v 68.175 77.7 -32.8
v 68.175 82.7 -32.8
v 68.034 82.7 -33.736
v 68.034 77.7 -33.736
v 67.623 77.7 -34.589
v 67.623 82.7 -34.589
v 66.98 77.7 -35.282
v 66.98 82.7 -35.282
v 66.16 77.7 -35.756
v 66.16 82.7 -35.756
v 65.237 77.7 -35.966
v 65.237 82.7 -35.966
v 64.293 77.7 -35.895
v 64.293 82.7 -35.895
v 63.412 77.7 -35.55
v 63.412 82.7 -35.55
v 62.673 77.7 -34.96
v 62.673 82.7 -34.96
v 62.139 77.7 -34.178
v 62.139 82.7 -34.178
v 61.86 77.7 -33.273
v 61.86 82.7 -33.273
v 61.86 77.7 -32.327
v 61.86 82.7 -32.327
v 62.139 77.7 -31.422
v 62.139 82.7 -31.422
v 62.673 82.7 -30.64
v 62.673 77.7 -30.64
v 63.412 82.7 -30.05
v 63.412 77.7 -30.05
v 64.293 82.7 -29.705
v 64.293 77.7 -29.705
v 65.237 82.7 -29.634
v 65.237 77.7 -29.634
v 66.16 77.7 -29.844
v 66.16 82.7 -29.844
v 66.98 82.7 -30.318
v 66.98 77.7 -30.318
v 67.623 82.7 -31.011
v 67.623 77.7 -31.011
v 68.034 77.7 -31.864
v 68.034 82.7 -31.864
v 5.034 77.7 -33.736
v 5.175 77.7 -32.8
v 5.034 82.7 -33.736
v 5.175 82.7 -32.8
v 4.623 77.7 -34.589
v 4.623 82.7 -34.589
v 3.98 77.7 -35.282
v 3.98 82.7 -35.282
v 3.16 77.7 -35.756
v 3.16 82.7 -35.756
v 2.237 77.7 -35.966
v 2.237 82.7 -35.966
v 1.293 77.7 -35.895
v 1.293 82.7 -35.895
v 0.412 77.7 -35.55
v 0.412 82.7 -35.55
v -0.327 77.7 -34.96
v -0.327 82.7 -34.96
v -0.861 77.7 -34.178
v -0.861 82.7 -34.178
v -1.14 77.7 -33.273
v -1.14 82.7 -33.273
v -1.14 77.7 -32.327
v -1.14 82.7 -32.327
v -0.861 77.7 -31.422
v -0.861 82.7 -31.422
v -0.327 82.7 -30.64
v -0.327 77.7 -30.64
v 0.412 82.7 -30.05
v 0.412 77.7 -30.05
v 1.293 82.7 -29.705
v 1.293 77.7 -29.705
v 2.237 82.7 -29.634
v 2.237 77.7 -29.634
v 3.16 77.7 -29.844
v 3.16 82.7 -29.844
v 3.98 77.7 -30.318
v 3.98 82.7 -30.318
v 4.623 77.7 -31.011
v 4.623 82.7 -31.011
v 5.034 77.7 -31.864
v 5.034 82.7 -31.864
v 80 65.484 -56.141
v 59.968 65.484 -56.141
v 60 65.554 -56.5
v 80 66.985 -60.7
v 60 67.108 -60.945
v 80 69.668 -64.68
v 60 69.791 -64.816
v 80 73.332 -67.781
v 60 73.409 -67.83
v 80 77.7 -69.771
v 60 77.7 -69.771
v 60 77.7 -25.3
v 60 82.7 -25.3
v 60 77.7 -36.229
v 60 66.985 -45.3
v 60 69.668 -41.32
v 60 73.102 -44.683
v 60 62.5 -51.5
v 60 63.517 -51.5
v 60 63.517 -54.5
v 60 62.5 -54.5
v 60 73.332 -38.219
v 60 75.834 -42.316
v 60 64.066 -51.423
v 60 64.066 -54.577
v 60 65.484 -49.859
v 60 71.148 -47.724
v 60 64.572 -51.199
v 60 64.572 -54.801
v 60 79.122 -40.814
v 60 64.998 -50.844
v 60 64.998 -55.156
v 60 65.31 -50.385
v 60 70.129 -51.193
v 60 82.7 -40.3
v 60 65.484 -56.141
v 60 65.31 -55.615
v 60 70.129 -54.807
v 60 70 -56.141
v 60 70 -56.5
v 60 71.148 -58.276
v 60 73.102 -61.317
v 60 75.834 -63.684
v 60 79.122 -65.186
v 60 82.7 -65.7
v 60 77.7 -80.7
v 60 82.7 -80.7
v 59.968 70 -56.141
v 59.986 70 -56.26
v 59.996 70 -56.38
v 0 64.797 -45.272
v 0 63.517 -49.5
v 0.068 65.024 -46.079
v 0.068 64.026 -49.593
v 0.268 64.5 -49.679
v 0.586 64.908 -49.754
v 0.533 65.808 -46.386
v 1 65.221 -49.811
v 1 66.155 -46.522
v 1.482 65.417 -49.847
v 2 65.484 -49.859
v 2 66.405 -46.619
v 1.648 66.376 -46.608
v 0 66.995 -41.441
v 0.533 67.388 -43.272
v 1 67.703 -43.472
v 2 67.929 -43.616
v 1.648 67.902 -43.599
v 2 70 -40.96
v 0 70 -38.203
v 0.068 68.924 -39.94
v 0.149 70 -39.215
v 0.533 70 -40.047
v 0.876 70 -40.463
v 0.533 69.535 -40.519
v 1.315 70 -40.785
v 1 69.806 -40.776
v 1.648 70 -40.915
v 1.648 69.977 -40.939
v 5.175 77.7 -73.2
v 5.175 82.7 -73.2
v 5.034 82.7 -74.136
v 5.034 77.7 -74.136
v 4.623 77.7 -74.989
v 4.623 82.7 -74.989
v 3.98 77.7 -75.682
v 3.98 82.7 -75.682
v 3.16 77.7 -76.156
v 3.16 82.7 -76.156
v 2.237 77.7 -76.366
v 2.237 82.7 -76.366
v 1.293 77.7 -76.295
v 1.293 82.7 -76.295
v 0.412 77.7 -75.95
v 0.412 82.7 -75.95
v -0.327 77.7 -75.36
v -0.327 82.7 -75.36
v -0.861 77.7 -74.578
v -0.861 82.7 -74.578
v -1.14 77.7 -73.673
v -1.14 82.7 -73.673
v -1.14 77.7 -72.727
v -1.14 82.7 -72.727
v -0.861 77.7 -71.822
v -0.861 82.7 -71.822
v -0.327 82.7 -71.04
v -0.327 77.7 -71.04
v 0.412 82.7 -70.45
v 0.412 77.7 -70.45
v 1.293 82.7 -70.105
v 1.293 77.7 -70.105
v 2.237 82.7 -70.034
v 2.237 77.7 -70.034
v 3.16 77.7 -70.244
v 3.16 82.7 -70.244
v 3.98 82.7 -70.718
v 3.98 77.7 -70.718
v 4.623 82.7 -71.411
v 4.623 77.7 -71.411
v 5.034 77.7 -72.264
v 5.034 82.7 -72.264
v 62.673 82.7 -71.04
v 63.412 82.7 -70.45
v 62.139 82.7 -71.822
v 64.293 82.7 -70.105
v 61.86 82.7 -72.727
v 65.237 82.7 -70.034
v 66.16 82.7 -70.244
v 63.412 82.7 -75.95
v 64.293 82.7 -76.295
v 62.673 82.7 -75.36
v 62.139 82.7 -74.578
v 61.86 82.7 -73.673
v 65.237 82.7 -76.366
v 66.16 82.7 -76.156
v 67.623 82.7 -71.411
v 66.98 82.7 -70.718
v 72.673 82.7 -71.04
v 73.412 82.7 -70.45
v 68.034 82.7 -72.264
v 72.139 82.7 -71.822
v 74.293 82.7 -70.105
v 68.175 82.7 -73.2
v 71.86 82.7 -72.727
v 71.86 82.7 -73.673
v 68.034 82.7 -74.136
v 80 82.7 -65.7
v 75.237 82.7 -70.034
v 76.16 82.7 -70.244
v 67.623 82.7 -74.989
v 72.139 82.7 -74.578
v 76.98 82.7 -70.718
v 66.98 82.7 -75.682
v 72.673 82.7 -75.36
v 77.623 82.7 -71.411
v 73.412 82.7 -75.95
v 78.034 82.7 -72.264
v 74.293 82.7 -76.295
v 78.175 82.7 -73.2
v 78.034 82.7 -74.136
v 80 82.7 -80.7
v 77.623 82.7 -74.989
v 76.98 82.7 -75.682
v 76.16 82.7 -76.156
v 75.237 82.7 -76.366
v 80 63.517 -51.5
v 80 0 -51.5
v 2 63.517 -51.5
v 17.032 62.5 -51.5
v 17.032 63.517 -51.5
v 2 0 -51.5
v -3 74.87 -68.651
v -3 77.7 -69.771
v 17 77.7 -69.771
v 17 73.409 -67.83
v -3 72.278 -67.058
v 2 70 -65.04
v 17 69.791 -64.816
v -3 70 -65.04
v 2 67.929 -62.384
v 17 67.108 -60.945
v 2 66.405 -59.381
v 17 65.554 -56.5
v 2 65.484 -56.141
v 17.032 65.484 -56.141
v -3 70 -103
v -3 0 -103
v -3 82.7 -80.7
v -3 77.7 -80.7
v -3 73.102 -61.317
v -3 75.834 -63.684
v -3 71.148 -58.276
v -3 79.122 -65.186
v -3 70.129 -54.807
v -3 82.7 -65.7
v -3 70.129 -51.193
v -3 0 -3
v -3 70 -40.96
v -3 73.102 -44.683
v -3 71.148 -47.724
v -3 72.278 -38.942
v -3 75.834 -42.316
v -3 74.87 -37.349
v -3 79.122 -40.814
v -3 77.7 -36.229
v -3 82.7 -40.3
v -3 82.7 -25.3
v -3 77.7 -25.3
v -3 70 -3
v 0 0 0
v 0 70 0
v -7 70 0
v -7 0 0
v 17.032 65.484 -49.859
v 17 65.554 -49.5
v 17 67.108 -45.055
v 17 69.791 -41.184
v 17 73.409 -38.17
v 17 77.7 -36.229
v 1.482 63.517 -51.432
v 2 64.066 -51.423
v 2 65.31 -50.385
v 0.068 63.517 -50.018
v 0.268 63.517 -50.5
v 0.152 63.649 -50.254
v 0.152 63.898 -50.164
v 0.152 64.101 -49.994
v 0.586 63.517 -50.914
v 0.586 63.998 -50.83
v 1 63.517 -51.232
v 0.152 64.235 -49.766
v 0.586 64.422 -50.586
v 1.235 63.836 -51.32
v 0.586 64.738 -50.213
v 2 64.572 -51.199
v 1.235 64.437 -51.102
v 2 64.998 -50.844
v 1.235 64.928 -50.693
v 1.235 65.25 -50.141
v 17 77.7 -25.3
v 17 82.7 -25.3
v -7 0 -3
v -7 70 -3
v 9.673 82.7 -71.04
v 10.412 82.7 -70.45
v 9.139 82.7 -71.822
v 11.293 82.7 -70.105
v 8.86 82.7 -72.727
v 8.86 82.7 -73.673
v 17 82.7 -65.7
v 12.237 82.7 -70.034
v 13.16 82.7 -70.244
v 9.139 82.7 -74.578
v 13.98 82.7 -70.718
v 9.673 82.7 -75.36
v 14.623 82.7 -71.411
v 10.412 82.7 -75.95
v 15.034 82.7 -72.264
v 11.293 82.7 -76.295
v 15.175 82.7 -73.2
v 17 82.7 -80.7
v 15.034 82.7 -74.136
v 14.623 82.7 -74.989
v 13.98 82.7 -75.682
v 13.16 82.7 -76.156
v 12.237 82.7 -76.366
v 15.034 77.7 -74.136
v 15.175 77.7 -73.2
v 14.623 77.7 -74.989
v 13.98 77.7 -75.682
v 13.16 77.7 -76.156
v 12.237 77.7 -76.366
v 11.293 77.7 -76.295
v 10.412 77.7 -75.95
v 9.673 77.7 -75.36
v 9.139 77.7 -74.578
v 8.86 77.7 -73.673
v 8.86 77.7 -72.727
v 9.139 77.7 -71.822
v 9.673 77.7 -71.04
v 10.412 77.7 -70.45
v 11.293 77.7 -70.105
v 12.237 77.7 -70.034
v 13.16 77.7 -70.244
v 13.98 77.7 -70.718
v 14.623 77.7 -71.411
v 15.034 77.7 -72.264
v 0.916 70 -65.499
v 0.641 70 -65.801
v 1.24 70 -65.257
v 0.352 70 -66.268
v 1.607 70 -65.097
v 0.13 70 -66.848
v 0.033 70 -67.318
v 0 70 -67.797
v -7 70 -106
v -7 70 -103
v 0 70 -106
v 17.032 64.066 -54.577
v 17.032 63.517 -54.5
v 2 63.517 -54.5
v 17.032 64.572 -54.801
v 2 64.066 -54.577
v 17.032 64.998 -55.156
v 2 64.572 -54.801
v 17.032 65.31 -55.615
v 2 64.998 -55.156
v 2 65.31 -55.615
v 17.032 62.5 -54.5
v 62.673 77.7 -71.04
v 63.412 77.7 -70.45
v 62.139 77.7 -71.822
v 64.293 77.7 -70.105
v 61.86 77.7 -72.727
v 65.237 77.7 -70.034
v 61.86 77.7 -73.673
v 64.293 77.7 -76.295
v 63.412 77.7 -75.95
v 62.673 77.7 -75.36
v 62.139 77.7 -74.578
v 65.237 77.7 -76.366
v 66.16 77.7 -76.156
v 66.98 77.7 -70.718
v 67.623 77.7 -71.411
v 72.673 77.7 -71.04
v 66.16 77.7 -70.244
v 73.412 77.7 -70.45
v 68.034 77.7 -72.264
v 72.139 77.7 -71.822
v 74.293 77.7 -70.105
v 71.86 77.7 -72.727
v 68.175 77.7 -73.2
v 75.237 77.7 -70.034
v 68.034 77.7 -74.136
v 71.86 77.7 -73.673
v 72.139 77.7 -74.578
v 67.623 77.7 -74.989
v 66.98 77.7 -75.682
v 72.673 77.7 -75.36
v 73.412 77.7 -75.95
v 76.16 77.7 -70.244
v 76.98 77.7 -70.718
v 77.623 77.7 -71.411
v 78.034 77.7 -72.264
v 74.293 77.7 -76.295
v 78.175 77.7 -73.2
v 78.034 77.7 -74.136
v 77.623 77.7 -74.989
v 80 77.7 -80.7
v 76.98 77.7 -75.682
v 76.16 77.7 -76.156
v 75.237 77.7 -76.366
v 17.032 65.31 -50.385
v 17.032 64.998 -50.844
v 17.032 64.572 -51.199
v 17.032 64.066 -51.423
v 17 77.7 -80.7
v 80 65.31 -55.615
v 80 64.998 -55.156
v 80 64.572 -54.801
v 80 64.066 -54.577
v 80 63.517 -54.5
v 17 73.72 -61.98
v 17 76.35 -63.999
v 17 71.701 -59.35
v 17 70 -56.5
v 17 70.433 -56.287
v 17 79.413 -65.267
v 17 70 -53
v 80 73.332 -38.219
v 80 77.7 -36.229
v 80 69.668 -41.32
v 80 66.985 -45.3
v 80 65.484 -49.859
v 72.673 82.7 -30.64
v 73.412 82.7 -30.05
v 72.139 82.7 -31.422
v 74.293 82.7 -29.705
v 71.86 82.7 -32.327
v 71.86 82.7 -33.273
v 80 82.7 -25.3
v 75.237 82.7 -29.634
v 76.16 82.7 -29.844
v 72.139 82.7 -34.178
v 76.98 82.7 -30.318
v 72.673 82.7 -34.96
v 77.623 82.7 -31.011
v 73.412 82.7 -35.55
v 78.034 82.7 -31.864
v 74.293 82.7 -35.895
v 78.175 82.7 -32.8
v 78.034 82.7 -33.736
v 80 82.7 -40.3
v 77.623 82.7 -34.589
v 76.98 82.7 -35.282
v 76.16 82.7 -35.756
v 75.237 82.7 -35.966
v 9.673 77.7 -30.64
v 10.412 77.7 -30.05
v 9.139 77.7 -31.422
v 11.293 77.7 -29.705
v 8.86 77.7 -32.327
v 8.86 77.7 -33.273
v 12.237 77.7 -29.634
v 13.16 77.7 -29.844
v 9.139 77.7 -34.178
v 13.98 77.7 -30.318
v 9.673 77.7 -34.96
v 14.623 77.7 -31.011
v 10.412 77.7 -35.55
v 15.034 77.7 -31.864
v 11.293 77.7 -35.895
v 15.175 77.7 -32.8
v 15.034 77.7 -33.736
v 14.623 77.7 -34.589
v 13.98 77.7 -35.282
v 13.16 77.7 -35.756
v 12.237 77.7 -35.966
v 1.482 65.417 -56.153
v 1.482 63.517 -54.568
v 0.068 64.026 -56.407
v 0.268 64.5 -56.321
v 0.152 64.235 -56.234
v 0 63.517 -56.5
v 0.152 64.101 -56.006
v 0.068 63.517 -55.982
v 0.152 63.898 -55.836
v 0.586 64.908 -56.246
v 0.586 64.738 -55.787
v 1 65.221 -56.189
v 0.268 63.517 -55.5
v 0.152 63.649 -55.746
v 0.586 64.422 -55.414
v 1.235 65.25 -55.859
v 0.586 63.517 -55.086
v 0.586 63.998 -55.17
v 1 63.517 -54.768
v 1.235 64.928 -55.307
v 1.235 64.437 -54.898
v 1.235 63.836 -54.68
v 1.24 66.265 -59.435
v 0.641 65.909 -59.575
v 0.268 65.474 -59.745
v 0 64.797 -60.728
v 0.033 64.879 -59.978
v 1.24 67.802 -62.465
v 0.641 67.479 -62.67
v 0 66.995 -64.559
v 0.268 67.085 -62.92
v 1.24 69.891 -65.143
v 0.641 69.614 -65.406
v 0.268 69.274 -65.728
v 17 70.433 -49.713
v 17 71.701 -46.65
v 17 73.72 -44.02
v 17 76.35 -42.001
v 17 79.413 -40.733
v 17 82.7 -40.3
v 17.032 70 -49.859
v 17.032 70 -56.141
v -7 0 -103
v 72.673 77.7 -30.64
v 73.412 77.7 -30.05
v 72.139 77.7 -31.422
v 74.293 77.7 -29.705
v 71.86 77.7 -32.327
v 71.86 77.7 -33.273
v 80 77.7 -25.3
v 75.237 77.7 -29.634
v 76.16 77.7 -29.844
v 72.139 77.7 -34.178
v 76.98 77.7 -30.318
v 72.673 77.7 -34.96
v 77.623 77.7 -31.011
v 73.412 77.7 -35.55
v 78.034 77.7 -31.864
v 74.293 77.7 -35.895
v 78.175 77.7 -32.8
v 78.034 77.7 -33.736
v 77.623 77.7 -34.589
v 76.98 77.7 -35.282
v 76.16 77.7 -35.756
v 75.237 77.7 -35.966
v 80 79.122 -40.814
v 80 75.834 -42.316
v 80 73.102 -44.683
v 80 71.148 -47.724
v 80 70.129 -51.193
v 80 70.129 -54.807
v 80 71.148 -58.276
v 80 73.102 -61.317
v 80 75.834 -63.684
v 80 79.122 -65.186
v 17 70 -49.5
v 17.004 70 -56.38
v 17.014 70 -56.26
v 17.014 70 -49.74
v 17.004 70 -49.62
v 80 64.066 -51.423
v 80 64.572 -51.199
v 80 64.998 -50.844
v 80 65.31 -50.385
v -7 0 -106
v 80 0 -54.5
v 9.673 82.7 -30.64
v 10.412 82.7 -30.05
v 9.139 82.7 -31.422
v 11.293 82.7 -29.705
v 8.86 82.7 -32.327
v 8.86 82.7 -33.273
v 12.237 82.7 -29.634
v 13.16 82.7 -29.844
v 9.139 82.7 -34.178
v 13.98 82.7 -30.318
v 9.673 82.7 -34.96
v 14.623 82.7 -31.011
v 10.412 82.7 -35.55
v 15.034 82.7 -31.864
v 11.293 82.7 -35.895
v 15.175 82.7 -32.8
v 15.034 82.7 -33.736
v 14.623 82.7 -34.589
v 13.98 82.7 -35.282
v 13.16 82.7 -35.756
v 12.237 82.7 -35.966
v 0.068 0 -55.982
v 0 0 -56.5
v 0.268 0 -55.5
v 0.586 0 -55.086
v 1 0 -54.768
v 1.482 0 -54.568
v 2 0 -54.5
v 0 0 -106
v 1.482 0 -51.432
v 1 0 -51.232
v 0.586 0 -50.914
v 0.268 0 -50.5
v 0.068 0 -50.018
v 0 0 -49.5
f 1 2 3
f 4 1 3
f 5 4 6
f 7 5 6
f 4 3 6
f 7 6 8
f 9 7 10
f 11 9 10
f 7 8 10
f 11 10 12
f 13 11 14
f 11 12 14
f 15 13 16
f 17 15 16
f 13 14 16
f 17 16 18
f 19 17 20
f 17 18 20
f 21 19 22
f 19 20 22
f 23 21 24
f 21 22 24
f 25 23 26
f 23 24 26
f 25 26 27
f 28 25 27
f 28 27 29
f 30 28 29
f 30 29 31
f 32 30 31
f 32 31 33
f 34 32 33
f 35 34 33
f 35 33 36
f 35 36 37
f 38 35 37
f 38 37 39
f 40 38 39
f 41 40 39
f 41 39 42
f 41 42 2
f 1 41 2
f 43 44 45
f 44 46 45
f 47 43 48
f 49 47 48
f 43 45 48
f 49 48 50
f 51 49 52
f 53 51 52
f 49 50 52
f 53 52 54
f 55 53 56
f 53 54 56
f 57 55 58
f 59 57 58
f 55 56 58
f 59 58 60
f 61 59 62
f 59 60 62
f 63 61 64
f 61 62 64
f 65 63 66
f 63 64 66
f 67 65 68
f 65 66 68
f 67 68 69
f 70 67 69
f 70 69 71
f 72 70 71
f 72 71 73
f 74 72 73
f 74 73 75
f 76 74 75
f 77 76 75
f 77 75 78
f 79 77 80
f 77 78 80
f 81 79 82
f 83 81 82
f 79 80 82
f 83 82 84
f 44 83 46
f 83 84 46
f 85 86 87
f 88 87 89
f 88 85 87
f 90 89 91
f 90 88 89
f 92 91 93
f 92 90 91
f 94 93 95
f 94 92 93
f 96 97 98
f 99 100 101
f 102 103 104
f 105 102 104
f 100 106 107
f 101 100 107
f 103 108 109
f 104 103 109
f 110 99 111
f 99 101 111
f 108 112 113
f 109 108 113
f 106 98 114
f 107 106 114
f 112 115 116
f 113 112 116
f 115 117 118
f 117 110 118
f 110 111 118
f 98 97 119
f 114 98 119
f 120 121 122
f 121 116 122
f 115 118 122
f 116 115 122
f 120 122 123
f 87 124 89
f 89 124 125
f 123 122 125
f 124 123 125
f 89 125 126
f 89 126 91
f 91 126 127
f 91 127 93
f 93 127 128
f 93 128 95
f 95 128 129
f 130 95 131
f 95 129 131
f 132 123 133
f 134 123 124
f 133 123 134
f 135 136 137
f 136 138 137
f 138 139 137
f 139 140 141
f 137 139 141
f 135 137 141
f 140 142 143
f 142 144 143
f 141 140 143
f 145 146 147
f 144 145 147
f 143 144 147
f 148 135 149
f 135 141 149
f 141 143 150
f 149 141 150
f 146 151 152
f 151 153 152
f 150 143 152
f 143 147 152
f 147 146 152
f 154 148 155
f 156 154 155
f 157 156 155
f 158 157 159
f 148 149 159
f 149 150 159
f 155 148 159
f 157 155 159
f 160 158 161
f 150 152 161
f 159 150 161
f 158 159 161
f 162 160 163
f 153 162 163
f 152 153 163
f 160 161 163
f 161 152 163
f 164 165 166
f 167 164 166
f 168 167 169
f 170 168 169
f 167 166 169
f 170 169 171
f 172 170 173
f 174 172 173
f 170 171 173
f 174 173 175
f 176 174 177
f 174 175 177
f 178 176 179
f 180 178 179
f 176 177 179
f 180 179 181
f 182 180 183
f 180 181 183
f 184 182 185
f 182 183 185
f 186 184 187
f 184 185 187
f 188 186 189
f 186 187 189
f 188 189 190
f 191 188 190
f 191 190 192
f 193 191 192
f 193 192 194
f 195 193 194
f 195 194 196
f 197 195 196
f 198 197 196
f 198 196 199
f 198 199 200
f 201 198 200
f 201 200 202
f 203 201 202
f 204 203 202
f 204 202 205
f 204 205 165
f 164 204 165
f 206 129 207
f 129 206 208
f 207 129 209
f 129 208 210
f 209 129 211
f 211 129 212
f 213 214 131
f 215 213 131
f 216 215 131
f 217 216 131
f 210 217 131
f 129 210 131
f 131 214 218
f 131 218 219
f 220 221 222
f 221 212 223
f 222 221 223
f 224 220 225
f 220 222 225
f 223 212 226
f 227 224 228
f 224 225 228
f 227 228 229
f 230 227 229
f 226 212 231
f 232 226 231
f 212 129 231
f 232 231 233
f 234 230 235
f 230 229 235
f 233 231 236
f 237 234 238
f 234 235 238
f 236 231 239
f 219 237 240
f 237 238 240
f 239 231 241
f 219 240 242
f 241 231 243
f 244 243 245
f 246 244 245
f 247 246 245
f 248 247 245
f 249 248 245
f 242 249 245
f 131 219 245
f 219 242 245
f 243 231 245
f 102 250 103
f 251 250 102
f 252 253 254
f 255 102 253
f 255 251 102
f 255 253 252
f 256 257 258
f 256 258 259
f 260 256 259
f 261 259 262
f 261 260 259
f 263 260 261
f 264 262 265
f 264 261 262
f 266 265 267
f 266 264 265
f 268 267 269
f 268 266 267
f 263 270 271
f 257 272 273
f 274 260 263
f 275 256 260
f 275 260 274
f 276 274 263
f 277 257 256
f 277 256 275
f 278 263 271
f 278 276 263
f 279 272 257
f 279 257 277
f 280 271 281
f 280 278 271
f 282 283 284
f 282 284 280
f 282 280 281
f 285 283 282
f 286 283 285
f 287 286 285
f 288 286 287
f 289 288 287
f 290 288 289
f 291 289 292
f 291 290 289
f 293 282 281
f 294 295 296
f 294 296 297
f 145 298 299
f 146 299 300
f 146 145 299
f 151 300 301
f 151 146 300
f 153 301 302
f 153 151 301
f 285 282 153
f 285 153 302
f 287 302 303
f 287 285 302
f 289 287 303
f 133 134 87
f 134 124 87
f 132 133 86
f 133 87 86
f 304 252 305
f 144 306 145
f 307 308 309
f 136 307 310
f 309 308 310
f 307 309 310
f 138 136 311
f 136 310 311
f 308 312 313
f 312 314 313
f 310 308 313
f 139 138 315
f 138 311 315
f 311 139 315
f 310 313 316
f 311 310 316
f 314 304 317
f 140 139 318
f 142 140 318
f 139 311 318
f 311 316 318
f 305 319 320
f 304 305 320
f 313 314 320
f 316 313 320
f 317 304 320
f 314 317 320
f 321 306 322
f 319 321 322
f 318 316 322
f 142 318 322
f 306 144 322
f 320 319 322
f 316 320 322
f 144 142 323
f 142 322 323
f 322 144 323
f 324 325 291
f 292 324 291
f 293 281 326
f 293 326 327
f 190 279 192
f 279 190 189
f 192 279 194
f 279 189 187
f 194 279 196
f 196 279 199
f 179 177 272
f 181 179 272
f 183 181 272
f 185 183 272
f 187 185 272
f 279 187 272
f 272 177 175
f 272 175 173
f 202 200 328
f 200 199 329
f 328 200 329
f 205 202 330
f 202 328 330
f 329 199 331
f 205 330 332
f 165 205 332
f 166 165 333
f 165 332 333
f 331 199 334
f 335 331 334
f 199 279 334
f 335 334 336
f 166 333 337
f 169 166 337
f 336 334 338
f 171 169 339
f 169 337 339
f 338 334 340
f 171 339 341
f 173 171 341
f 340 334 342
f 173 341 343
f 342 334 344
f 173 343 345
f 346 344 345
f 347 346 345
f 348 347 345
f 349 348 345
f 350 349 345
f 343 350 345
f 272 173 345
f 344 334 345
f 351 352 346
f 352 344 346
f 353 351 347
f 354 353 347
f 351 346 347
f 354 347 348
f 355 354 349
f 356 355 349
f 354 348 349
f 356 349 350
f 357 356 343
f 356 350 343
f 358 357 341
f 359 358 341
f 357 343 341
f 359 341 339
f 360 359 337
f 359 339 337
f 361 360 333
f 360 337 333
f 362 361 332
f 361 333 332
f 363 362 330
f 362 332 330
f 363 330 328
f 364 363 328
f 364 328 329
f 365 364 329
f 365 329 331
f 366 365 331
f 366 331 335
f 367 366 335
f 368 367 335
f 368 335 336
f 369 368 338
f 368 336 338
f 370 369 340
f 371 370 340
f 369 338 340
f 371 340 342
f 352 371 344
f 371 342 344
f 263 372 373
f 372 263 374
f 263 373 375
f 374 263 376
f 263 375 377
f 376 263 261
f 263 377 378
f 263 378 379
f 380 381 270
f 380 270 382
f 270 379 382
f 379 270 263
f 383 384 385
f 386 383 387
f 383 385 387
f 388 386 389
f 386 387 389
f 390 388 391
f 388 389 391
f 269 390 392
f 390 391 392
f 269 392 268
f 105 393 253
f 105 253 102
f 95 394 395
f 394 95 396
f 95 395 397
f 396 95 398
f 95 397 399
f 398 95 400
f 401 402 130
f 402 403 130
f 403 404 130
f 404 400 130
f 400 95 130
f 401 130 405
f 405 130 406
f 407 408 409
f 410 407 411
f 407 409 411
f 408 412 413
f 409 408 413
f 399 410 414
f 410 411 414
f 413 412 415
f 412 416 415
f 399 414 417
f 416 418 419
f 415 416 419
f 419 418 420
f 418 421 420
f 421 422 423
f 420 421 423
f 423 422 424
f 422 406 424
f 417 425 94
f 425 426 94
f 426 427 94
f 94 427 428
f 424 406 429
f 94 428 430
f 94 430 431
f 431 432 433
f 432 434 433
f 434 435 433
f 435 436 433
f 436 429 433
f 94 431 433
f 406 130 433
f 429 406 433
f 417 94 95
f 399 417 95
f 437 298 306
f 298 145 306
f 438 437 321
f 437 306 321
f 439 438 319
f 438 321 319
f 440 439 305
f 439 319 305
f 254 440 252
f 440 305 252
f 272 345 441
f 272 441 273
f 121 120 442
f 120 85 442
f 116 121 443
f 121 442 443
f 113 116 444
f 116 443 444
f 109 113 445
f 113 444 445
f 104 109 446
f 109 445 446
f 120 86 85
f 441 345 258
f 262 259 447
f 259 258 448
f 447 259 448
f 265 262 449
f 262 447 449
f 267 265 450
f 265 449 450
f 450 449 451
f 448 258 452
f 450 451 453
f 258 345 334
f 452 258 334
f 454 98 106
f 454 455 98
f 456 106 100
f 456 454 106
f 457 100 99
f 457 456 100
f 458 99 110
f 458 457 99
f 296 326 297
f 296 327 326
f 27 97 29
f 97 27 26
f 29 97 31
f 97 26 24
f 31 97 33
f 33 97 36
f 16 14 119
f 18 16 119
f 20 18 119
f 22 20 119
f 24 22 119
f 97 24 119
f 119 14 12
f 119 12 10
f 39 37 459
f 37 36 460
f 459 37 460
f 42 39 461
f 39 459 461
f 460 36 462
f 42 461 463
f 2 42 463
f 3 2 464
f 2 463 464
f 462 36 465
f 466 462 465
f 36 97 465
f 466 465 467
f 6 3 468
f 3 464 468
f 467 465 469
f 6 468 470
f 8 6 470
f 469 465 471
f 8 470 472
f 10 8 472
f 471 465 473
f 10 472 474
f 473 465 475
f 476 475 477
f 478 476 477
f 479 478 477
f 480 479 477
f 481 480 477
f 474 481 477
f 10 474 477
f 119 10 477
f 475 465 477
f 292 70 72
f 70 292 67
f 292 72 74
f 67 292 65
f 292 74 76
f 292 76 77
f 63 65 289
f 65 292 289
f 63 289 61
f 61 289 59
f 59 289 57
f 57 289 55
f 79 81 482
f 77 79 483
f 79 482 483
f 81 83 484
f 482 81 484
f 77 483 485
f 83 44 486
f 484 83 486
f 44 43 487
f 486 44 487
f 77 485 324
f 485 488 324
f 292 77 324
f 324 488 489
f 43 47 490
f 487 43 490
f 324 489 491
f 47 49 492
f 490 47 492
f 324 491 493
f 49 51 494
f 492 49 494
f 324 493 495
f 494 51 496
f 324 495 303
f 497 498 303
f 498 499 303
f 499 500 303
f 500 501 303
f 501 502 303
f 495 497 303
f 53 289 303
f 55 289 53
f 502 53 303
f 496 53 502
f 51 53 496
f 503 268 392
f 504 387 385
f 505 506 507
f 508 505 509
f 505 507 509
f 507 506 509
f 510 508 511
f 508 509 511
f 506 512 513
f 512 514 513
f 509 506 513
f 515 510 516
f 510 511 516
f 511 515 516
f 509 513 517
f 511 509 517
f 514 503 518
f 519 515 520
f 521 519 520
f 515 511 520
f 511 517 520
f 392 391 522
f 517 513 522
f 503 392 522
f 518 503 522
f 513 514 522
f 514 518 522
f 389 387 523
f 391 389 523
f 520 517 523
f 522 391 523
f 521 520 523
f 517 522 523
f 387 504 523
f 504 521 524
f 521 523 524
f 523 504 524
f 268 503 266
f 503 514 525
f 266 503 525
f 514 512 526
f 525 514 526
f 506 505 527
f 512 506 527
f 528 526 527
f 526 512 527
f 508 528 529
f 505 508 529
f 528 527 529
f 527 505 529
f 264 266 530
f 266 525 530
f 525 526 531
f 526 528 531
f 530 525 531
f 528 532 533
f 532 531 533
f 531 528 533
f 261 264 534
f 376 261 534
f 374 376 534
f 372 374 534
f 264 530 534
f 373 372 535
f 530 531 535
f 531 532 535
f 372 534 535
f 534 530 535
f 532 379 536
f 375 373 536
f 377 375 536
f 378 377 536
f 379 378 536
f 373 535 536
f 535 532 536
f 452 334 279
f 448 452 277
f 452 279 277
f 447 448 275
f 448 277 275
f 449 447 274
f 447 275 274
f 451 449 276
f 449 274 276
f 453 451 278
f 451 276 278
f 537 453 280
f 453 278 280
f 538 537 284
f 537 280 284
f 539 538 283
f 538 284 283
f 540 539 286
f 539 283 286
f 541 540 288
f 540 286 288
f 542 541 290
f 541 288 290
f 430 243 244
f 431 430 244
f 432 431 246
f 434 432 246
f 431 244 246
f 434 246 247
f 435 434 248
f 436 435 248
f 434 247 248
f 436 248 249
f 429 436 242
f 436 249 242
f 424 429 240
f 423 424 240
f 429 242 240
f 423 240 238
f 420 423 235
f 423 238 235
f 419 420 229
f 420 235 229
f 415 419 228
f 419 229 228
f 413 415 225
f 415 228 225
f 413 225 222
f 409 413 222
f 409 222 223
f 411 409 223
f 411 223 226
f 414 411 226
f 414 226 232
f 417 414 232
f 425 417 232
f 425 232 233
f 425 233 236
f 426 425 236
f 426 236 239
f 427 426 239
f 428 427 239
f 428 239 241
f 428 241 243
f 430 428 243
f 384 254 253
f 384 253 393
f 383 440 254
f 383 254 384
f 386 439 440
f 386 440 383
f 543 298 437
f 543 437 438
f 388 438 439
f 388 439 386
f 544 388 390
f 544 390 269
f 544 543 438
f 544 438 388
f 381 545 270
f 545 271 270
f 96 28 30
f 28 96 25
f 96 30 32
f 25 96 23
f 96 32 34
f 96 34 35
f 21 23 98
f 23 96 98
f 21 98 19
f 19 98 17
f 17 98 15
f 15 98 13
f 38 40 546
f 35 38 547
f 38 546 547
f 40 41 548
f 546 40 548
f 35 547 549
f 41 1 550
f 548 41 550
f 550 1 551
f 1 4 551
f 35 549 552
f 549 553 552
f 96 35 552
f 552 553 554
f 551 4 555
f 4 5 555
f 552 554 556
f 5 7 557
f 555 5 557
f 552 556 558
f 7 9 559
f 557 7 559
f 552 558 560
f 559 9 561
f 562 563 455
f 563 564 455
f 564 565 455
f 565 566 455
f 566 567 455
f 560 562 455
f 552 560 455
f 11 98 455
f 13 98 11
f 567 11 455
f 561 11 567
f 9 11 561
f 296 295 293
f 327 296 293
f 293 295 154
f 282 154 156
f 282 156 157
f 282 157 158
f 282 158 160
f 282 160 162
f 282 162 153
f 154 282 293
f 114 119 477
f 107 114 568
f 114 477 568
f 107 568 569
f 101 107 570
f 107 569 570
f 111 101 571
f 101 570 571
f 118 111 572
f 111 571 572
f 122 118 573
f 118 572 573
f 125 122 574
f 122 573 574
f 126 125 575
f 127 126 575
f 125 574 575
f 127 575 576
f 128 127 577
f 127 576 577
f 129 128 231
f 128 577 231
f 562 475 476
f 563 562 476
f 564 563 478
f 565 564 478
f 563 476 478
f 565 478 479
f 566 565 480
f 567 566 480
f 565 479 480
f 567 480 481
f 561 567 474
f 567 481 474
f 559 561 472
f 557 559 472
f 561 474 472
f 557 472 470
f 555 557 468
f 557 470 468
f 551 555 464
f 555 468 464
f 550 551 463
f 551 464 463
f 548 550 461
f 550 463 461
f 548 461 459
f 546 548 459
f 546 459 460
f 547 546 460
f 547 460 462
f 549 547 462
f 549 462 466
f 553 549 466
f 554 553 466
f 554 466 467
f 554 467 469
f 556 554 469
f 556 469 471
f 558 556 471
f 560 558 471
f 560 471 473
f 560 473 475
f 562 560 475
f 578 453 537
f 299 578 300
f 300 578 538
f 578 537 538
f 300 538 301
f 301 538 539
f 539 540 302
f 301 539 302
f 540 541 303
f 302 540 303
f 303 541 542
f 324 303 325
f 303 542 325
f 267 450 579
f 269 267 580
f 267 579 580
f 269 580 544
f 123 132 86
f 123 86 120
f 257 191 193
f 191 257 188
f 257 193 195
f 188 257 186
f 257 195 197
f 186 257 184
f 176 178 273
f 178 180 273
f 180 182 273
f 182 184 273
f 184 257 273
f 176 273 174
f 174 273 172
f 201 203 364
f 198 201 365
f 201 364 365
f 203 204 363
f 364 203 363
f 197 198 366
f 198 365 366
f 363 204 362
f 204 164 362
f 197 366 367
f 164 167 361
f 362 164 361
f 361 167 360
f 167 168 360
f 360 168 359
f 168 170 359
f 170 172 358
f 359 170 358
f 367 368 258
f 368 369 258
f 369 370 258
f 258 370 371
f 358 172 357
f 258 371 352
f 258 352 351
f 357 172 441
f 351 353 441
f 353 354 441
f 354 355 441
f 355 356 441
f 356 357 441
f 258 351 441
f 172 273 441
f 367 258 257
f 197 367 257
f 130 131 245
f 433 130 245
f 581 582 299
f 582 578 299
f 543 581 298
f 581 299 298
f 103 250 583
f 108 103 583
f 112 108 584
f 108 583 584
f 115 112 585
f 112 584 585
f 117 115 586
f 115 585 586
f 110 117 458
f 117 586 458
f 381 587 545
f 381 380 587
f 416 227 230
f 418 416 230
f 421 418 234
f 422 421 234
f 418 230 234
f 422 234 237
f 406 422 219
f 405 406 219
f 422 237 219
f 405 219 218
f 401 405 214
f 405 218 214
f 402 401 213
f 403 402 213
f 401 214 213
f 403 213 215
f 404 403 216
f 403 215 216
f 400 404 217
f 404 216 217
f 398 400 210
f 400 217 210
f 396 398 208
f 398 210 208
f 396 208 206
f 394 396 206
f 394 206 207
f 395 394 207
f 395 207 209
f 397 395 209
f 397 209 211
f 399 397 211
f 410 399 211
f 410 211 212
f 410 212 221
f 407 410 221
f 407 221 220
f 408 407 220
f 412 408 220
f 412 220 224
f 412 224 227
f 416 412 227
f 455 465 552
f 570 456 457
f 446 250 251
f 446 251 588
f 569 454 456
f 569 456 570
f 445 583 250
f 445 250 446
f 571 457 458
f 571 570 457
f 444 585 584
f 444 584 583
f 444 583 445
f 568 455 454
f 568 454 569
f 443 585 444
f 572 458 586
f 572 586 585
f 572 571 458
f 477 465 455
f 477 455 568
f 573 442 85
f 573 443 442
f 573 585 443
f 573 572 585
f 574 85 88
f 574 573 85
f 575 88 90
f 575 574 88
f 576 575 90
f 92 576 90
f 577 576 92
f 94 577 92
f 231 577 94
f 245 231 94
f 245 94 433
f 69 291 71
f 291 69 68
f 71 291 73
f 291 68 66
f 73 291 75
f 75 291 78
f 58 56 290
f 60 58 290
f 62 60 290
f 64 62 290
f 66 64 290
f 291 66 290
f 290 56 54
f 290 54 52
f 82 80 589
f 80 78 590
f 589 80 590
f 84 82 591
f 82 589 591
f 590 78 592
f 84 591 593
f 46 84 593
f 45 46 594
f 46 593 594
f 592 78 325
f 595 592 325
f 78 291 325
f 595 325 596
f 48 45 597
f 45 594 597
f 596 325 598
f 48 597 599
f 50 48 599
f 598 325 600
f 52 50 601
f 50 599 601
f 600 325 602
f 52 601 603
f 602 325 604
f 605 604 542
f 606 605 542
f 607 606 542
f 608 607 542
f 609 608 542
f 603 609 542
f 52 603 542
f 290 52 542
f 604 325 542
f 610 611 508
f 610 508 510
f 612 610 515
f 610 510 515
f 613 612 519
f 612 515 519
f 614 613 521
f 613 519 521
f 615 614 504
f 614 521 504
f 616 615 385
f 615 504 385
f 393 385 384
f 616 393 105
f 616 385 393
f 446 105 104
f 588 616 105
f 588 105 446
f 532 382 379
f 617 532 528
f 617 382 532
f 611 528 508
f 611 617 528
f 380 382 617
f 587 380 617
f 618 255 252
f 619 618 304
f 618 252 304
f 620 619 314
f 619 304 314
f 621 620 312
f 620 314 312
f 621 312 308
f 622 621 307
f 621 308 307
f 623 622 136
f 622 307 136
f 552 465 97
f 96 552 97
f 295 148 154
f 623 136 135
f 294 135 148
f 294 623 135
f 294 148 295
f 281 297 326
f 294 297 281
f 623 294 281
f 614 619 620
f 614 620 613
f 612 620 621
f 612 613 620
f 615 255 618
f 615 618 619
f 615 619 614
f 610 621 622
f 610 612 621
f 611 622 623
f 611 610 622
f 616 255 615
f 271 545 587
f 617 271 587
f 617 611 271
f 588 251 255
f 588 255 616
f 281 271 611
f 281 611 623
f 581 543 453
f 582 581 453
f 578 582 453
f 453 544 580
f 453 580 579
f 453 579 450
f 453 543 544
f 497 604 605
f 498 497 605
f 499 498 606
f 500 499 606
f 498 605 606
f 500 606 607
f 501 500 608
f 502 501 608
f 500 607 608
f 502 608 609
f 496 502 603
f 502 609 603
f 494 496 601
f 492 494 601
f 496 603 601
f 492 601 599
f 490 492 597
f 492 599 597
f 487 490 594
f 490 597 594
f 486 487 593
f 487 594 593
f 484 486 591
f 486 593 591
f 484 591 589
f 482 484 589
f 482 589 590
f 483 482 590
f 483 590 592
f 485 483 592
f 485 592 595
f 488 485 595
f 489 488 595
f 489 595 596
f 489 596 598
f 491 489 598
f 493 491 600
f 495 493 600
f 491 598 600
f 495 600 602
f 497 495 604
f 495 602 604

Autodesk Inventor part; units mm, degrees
ref_plane "YZ Plane" through (0, 0, 0) normal (1, 0, 0) x (0, 1, 0)
ref_plane "XZ Plane" through (0, 0, 0) normal (0, 1, 0) x (-1, 0, 0)
ref_plane "XY Plane" through (0, 0, 0) normal (0, 0, 1) x (1, 0, 0)
sketch "Sketch1" plane through (0, 0, 0) normal (0, 1, 0) x (-1, 0, 0)
  line L0 (0, 0) -> (3, 0)
  line L1 (3, 0) -> (3, -106)
  line L2 (3, -106) -> (0, -106)
  line L3 (0, -106) -> (0, 0)
  line L4 (0, -53) -> (-80, -53) construction
  line L5 (-80, -51.5) -> (0, -51.5)
  line L6 (0, -51.5) -> (0, -54.5)
  line L7 (0, -54.5) -> (-80, -54.5)
  line L8 (-80, -54.5) -> (-80, -51.5)
  line L9 (-80, -51.5) -> (0, -54.5) construction
  line L10 (0, -51.5) -> (-80, -54.5) construction
  point P0 (-40, -53)
  dimension "d0" = 3
  dimension "d1" = 106
  dimension "d2" = 80
  dimension "d3" = 3
extrude "Extrusion1" add sketch "Sketch1" along normal blind 70
sketch "Sketch2" plane through (-3, 0, -106) normal (-1, 0, 0) x (0, 0, 1)
  line L0 (0, 0) -> (106, 0) projected
  line L1 (0, 70) -> (106, 70) projected
  line L2 (106, 0) -> (103, 0)
  line L3 (103, 0) -> (103, 70)
  line L4 (103, 70) -> (106, 70)
  line L5 (106, 70) -> (106, 0)
  dimension "d6" = 3
sketch "Sketch3" plane through (-3, 0, -106) normal (-1, 0, 0) x (0, 0, 1)
  line L0 (51.5, 70) -> (0, 70) projected
  line L1 (0, 0) -> (3, 0)
  line L2 (3, 0) -> (3, 70)
  line L3 (3, 70) -> (0, 70)
  line L4 (0, 70) -> (0, 0)
  point P0 (106, 0)
  dimension "d7" = 3
sketch "Sketch4" plane through (-3, 0, -106) normal (-1, 0, 0) x (0, 0, 1)
  line L0 (51.5, 0) -> (0, 0) projected
  line L1 (51.5, 70) -> (0, 70) projected
  line L2 (0, 0) -> (3, 0)
  line L3 (3, 0) -> (3, 70)
  line L4 (3, 70) -> (0, 70)
  line L5 (0, 70) -> (0, 0)
  point P0 (106, 0)
  dimension "d8" = 3
extrude "Extrusion2" add sketch "Sketch2" along normal blind 4
extrude "Extrusion3" add sketch "Sketch4" along normal blind 4
sketch "Sketch5" plane through (-3, 0, -3) normal (-1, 0, 0) x (0, 0, 1)
  line L0 (-103, 0) -> (-103, 70) construction
  line L1 (-103, 70) -> (3, 70) construction
  line L2 (3, 70) -> (-50, 70) construction
  line L3 (-50, 70) -> (-50, 82.7) construction
  circle A0 centre (-50, 82.7) radius 12.7
  circle A1 centre (-50, 82.7) radius 17.5
  point P0 (3, 0)
  dimension "d13" = 12.7
  dimension "d14" = 25.4
  dimension "d15" = 35
extrude "Extrusion4" add sketch "Sketch5" against normal blind 20
sketch "Sketch6" plane through (80, 0, -51.5) normal (1, 0, 0) x (0, 0, -1)
  circle A0 centre (1.5, 82.7) radius 12.7 projected
  circle A1 centre (1.5, 82.7) radius 12.7
  circle A2 centre (1.5, 82.7) radius 17.5
  point P0 (-51.5, 0)
  point P1 (1.5, 70)
extrude "Extrusion5" add sketch "Sketch6" against normal blind 20
sketch "Sketch7" plane through (80, 0, -51.5) normal (1, 0, 0) x (0, 0, -1)
  arc A0 (3, 65.2644) -> (0, 65.2644) centre (1.5, 82.7) ccw projected
  line L0 (1.5, 82.7) -> (-23.0448, 82.7)
  line L1 (-23.0448, 82.7) -> (-23.0448, 99.7436)
  line L2 (-23.0448, 99.7436) -> (1.5, 99.7436)
  line L3 (1.5, 99.7436) -> (1.5, 82.7)
  line L4 (-23.0448, 82.7) -> (23.5266, 82.7)
  line L5 (23.5266, 82.7) -> (23.5266, 103.3181)
  line L6 (23.5266, 103.3181) -> (-23.0448, 103.3181)
  line L7 (-23.0448, 103.3181) -> (-23.0448, 82.7)
  point P0 (-51.5, 0)
extrude "Extrusion6" cut sketch "Sketch7" against normal blind 2000
sketch "Sketch8" plane through (80, 82.7, -65.7) normal (0, 1, 0) x (1, 0, 0)
  line L0 (-83, -25.4) -> (-83, 0) projected
  line L1 (-83, 0) -> (-63, 0)
  line L2 (-63, 0) -> (-63, 15)
  line L3 (-63, 15) -> (-83, 15)
  line L4 (-83, 15) -> (-83, 0)
  line L5 (0, 0) -> (-20, 0) projected
  line L6 (0, 0) -> (-20, 0)
  line L7 (-20, 0) -> (-20, 15)
  line L8 (-20, 15) -> (0, 15)
  line L9 (0, 15) -> (0, 0)
  line L10 (-20, -25.4) -> (0, -25.4) projected
  line L11 (-20, -25.4) -> (0, -25.4)
  line L12 (0, -25.4) -> (0, -40.4)
  line L13 (0, -40.4) -> (-20, -40.4)
  line L14 (-20, -40.4) -> (-20, -25.4)
  line L15 (-83, -25.4) -> (-63, -25.4)
  line L16 (-63, -25.4) -> (-63, -40.4)
  line L17 (-63, -40.4) -> (-83, -40.4)
  line L18 (-83, -40.4) -> (-83, -25.4)
  point P0 (-80, -65.7)
  dimension "d22" = 15
  dimension "d23" = 15
  dimension "d24" = 15
  dimension "d25" = 20
extrude "Extrusion7" add sketch "Sketch8" against normal blind 5
fillet "Fillet1" radius 2 12 edges at (0, 32.6322, -54.5) (0, 66.7372, -60.1721) (8.5, 65.2644, -54.5) (17, 67.6322, -54.5) (70, 65.2644, -54.5) (60, 67.6322, -54.5) (0, 32.6322, -51.5) (8.5, 65.2644, -51.5) (0, 66.7372, -45.8279) (17, 67.6322, -51.5) (70, 65.2644, -51.5) (60, 67.6322, -51.5)
sketch "Sketch9" plane through (0, 70, 0) normal (0, 1, 0) x (1, 0, 0)
  arc A0 (17.0325, 56.141) -> (19, 54.5) centre (19, 56.5) ccw projected
  line L0 (60, 49.5) -> (60, 53) projected
  line L1 (17.0325, 56.141) -> (60, 56.141)
  line L2 (60, 56.141) -> (60, 49.5)
  line L3 (60, 49.5) -> (17.0325, 49.5)
  line L4 (17.0325, 49.5) -> (17.0325, 56.141)
  point P0 (0, 0)
extrude "Extrusion8" cut sketch "Sketch9" against normal blind 7.5
sketch "Sketch10" plane through (-3, 82.7, -40.3) normal (0, 1, 0) x (1, 0, 0)
  line L0 (20, -4.0705) -> (20, -15) projected
  line L1 (0, 0) -> (20, 0) projected
  line L2 (20, -15) -> (0, -15)
  line L3 (0, -15) -> (0, 0)
  line L4 (0, 0) -> (20, 0)
  line L5 (20, 0) -> (20, -15)
  line L6 (20, -15) -> (0, -15) construction
  line L7 (10, -15) -> (10, 40.4) construction
  line L8 (0, 40.4) -> (20, 40.4) construction
  line L9 (0, -15) -> (10, 0) construction
  line L10 (0, 0) -> (10, -15) construction
  line L11 (20, 0) -> (10, -15) construction
  line L12 (20, -15) -> (10, 0) construction
  line L13 (20, 25.4) -> (0, 25.4) construction
  line L14 (10, 25.4) -> (0, 40.4) construction
  line L15 (0, 62.7) -> (0, -37.3) construction
  line L16 (0, 25.4) -> (10, 40.4) construction
  line L17 (10, 40.4) -> (20, 25.4) construction
  line L18 (20, 25.4) -> (15, 32.9) construction
  line L19 (20, 40.4) -> (20, 25.4) construction
  line L20 (10, 25.4) -> (20, 40.4) construction
  circle A0 centre (5, -7.5) radius 3.175
  circle A1 centre (15, -7.5) radius 3.175
  circle A2 centre (5, 32.9) radius 3.175
  circle A3 centre (15, 32.9) radius 3.175
  point P0 (3, -40.3)
  dimension "d31" = 6.35
  dimension "d32" = 6.35
  dimension "d33" = 6.35
  dimension "d34" = 6.35
extrude "Extrusion9" cut sketch "Sketch10" against normal blind 7.5 contours A0 | A1 | A2 | A3
sketch "Sketch11" plane through (60, 82.7, -40.3) normal (0, 1, 0) x (1, 0, 0)
  line L0 (20, -15) -> (0, -15) construction
  line L1 (10, -15) -> (10, 40.4) construction
  line L2 (0, 40.4) -> (20, 40.4) construction
  line L3 (0, 40.4) -> (10, 25.4) construction
  line L4 (20, 25.4) -> (0, 25.4) construction
  line L5 (5, 32.9) -> (20, 32.9) construction
  line L6 (20, 40.4) -> (20, 29.4705) construction
  line L7 (10, 25.4) -> (20, 40.4) construction
  line L8 (0, -15) -> (10, 0) construction
  line L9 (0, 0) -> (20, 0) construction
  line L10 (0, 0) -> (10, -15) construction
  line L11 (20, 0) -> (20, -15) construction
  line L12 (10, -15) -> (20, 0) construction
  line L13 (20, 0) -> (10, 0) construction
  line L14 (20, -15) -> (10, 0) construction
  circle A0 centre (5, -7.5) radius 3.175
  circle A1 centre (15, -7.5) radius 3.175
  circle A2 centre (5, 32.9) radius 3.175
  circle A3 centre (15, 32.9) radius 3.175
  point P0 (-60, -40.3)
  dimension "d37" = 6.35
  dimension "d38" = 6.35
  dimension "d39" = 6.35
  dimension "d40" = 6.35
extrude "Extrusion10" cut sketch "Sketch11" against normal blind 7.5
properties part number "scopeHolderv2"
